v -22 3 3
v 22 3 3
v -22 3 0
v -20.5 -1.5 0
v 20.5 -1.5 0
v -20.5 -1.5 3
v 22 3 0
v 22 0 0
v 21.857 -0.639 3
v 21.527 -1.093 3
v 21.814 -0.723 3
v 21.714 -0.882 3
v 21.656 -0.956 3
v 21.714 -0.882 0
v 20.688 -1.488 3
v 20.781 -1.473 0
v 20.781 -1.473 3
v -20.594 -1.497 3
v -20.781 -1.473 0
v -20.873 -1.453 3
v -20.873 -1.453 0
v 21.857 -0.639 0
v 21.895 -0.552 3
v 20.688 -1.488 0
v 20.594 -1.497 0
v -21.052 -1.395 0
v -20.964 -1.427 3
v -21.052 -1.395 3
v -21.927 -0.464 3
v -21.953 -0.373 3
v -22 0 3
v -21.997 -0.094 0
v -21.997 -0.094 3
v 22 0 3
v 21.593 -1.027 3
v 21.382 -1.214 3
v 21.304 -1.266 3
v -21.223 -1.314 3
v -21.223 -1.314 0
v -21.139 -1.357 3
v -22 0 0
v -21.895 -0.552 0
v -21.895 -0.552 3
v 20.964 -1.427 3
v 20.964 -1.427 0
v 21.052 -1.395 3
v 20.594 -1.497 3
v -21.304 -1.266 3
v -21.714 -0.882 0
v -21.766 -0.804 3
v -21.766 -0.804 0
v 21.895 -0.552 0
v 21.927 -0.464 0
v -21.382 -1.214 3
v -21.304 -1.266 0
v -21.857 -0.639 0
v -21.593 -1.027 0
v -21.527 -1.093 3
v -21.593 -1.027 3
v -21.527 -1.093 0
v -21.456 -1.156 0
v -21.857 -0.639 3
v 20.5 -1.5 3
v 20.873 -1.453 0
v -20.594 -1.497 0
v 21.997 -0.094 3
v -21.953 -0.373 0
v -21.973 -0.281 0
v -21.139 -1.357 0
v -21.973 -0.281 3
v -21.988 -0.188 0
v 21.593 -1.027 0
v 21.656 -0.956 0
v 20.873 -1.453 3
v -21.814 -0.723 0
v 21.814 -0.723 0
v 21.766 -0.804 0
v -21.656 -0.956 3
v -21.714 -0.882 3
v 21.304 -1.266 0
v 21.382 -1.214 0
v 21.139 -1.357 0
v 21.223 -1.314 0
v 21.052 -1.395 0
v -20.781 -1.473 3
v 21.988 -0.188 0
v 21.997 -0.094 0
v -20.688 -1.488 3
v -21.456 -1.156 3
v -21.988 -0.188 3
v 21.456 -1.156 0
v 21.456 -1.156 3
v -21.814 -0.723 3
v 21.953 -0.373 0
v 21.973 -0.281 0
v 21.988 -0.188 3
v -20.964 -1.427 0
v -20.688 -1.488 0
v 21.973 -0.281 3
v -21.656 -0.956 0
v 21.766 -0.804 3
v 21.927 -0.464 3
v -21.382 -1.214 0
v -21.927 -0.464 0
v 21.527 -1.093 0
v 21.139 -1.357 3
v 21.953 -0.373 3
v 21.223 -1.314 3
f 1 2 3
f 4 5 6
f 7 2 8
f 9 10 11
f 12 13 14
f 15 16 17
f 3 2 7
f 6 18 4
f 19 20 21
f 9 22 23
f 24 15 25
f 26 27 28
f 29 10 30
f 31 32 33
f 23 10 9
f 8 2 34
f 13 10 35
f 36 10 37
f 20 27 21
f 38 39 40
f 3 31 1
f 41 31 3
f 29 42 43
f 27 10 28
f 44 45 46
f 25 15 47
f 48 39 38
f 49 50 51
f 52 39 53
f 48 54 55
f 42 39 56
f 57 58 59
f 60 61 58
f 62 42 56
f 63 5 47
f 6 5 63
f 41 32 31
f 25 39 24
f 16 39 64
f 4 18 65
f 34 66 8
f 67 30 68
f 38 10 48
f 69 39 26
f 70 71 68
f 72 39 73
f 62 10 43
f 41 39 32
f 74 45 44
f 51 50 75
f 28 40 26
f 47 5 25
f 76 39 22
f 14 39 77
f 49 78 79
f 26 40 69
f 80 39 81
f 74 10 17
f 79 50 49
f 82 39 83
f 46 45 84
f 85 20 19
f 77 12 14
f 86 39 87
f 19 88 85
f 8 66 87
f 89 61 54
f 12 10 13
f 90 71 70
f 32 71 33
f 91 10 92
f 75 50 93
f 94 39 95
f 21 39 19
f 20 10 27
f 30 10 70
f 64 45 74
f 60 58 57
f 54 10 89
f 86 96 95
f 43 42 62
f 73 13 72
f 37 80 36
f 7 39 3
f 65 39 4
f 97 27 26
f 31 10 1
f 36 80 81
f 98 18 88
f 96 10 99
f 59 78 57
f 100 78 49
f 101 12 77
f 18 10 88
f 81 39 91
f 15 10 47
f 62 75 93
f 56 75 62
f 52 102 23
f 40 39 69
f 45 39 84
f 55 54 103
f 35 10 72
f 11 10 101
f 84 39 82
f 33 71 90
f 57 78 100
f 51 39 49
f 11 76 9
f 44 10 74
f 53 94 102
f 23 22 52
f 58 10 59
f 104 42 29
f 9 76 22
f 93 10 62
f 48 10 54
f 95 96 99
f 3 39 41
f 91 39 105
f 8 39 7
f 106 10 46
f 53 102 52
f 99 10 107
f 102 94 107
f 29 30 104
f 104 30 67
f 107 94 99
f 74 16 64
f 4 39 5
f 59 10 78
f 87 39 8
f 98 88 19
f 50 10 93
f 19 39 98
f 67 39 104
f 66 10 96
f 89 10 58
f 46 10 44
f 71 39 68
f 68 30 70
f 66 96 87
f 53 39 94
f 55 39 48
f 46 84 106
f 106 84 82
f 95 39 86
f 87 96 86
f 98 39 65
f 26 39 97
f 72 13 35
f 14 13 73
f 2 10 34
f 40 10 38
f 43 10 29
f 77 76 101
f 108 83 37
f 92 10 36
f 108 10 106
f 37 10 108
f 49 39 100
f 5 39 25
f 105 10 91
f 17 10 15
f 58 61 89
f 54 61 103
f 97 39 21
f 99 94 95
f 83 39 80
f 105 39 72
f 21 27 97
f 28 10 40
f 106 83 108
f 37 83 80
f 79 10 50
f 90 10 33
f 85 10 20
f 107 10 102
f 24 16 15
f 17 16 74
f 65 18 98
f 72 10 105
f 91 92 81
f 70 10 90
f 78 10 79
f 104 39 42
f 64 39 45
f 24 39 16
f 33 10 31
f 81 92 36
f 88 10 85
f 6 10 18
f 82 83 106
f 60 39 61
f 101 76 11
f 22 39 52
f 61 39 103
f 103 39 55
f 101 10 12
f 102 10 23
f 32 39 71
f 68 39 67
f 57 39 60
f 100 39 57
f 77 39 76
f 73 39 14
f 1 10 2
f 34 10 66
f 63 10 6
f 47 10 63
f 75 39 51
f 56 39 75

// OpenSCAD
// file: constant.scad
THREAD_SIZE = [50, 20, 7.5];

TOOTH_SIZE = [15, 5, 5];
TOOTH_SPACING = (THREAD_SIZE.y - THREAD_SIZE.z) - TOOTH_SIZE.y;

// CHAIN_GRIP.x is a border from thread side
CHAIN_GRIP = [3, 3, 3];
// main file
include <constant.scad>

DEBUG = false;
$fn = DEBUG ? 0 : 100;

WIDTH = THREAD_SIZE.x - 2 * CHAIN_GRIP.x;

HEIGHT = 1.5;
ROUND = 1.5;

module grip() {
    module rounded() {
        translate([0, CHAIN_GRIP.y / 2, 0])
        rotate([90, 0, 0])
            cylinder(CHAIN_GRIP.y, r=ROUND);
    }
    
    hull() {
        translate([0, 0, -CHAIN_GRIP.z / 2])
            cube([WIDTH, CHAIN_GRIP.y, CHAIN_GRIP.z], center=true);
        
        translate([-WIDTH / 2 + ROUND, 0, HEIGHT - ROUND])
            rounded();
        translate([WIDTH / 2 - ROUND, 0, HEIGHT - ROUND])
            rounded();
    }
}

translate([0, 0, CHAIN_GRIP.y / 2])
rotate([90, 0, 0])
    grip();
